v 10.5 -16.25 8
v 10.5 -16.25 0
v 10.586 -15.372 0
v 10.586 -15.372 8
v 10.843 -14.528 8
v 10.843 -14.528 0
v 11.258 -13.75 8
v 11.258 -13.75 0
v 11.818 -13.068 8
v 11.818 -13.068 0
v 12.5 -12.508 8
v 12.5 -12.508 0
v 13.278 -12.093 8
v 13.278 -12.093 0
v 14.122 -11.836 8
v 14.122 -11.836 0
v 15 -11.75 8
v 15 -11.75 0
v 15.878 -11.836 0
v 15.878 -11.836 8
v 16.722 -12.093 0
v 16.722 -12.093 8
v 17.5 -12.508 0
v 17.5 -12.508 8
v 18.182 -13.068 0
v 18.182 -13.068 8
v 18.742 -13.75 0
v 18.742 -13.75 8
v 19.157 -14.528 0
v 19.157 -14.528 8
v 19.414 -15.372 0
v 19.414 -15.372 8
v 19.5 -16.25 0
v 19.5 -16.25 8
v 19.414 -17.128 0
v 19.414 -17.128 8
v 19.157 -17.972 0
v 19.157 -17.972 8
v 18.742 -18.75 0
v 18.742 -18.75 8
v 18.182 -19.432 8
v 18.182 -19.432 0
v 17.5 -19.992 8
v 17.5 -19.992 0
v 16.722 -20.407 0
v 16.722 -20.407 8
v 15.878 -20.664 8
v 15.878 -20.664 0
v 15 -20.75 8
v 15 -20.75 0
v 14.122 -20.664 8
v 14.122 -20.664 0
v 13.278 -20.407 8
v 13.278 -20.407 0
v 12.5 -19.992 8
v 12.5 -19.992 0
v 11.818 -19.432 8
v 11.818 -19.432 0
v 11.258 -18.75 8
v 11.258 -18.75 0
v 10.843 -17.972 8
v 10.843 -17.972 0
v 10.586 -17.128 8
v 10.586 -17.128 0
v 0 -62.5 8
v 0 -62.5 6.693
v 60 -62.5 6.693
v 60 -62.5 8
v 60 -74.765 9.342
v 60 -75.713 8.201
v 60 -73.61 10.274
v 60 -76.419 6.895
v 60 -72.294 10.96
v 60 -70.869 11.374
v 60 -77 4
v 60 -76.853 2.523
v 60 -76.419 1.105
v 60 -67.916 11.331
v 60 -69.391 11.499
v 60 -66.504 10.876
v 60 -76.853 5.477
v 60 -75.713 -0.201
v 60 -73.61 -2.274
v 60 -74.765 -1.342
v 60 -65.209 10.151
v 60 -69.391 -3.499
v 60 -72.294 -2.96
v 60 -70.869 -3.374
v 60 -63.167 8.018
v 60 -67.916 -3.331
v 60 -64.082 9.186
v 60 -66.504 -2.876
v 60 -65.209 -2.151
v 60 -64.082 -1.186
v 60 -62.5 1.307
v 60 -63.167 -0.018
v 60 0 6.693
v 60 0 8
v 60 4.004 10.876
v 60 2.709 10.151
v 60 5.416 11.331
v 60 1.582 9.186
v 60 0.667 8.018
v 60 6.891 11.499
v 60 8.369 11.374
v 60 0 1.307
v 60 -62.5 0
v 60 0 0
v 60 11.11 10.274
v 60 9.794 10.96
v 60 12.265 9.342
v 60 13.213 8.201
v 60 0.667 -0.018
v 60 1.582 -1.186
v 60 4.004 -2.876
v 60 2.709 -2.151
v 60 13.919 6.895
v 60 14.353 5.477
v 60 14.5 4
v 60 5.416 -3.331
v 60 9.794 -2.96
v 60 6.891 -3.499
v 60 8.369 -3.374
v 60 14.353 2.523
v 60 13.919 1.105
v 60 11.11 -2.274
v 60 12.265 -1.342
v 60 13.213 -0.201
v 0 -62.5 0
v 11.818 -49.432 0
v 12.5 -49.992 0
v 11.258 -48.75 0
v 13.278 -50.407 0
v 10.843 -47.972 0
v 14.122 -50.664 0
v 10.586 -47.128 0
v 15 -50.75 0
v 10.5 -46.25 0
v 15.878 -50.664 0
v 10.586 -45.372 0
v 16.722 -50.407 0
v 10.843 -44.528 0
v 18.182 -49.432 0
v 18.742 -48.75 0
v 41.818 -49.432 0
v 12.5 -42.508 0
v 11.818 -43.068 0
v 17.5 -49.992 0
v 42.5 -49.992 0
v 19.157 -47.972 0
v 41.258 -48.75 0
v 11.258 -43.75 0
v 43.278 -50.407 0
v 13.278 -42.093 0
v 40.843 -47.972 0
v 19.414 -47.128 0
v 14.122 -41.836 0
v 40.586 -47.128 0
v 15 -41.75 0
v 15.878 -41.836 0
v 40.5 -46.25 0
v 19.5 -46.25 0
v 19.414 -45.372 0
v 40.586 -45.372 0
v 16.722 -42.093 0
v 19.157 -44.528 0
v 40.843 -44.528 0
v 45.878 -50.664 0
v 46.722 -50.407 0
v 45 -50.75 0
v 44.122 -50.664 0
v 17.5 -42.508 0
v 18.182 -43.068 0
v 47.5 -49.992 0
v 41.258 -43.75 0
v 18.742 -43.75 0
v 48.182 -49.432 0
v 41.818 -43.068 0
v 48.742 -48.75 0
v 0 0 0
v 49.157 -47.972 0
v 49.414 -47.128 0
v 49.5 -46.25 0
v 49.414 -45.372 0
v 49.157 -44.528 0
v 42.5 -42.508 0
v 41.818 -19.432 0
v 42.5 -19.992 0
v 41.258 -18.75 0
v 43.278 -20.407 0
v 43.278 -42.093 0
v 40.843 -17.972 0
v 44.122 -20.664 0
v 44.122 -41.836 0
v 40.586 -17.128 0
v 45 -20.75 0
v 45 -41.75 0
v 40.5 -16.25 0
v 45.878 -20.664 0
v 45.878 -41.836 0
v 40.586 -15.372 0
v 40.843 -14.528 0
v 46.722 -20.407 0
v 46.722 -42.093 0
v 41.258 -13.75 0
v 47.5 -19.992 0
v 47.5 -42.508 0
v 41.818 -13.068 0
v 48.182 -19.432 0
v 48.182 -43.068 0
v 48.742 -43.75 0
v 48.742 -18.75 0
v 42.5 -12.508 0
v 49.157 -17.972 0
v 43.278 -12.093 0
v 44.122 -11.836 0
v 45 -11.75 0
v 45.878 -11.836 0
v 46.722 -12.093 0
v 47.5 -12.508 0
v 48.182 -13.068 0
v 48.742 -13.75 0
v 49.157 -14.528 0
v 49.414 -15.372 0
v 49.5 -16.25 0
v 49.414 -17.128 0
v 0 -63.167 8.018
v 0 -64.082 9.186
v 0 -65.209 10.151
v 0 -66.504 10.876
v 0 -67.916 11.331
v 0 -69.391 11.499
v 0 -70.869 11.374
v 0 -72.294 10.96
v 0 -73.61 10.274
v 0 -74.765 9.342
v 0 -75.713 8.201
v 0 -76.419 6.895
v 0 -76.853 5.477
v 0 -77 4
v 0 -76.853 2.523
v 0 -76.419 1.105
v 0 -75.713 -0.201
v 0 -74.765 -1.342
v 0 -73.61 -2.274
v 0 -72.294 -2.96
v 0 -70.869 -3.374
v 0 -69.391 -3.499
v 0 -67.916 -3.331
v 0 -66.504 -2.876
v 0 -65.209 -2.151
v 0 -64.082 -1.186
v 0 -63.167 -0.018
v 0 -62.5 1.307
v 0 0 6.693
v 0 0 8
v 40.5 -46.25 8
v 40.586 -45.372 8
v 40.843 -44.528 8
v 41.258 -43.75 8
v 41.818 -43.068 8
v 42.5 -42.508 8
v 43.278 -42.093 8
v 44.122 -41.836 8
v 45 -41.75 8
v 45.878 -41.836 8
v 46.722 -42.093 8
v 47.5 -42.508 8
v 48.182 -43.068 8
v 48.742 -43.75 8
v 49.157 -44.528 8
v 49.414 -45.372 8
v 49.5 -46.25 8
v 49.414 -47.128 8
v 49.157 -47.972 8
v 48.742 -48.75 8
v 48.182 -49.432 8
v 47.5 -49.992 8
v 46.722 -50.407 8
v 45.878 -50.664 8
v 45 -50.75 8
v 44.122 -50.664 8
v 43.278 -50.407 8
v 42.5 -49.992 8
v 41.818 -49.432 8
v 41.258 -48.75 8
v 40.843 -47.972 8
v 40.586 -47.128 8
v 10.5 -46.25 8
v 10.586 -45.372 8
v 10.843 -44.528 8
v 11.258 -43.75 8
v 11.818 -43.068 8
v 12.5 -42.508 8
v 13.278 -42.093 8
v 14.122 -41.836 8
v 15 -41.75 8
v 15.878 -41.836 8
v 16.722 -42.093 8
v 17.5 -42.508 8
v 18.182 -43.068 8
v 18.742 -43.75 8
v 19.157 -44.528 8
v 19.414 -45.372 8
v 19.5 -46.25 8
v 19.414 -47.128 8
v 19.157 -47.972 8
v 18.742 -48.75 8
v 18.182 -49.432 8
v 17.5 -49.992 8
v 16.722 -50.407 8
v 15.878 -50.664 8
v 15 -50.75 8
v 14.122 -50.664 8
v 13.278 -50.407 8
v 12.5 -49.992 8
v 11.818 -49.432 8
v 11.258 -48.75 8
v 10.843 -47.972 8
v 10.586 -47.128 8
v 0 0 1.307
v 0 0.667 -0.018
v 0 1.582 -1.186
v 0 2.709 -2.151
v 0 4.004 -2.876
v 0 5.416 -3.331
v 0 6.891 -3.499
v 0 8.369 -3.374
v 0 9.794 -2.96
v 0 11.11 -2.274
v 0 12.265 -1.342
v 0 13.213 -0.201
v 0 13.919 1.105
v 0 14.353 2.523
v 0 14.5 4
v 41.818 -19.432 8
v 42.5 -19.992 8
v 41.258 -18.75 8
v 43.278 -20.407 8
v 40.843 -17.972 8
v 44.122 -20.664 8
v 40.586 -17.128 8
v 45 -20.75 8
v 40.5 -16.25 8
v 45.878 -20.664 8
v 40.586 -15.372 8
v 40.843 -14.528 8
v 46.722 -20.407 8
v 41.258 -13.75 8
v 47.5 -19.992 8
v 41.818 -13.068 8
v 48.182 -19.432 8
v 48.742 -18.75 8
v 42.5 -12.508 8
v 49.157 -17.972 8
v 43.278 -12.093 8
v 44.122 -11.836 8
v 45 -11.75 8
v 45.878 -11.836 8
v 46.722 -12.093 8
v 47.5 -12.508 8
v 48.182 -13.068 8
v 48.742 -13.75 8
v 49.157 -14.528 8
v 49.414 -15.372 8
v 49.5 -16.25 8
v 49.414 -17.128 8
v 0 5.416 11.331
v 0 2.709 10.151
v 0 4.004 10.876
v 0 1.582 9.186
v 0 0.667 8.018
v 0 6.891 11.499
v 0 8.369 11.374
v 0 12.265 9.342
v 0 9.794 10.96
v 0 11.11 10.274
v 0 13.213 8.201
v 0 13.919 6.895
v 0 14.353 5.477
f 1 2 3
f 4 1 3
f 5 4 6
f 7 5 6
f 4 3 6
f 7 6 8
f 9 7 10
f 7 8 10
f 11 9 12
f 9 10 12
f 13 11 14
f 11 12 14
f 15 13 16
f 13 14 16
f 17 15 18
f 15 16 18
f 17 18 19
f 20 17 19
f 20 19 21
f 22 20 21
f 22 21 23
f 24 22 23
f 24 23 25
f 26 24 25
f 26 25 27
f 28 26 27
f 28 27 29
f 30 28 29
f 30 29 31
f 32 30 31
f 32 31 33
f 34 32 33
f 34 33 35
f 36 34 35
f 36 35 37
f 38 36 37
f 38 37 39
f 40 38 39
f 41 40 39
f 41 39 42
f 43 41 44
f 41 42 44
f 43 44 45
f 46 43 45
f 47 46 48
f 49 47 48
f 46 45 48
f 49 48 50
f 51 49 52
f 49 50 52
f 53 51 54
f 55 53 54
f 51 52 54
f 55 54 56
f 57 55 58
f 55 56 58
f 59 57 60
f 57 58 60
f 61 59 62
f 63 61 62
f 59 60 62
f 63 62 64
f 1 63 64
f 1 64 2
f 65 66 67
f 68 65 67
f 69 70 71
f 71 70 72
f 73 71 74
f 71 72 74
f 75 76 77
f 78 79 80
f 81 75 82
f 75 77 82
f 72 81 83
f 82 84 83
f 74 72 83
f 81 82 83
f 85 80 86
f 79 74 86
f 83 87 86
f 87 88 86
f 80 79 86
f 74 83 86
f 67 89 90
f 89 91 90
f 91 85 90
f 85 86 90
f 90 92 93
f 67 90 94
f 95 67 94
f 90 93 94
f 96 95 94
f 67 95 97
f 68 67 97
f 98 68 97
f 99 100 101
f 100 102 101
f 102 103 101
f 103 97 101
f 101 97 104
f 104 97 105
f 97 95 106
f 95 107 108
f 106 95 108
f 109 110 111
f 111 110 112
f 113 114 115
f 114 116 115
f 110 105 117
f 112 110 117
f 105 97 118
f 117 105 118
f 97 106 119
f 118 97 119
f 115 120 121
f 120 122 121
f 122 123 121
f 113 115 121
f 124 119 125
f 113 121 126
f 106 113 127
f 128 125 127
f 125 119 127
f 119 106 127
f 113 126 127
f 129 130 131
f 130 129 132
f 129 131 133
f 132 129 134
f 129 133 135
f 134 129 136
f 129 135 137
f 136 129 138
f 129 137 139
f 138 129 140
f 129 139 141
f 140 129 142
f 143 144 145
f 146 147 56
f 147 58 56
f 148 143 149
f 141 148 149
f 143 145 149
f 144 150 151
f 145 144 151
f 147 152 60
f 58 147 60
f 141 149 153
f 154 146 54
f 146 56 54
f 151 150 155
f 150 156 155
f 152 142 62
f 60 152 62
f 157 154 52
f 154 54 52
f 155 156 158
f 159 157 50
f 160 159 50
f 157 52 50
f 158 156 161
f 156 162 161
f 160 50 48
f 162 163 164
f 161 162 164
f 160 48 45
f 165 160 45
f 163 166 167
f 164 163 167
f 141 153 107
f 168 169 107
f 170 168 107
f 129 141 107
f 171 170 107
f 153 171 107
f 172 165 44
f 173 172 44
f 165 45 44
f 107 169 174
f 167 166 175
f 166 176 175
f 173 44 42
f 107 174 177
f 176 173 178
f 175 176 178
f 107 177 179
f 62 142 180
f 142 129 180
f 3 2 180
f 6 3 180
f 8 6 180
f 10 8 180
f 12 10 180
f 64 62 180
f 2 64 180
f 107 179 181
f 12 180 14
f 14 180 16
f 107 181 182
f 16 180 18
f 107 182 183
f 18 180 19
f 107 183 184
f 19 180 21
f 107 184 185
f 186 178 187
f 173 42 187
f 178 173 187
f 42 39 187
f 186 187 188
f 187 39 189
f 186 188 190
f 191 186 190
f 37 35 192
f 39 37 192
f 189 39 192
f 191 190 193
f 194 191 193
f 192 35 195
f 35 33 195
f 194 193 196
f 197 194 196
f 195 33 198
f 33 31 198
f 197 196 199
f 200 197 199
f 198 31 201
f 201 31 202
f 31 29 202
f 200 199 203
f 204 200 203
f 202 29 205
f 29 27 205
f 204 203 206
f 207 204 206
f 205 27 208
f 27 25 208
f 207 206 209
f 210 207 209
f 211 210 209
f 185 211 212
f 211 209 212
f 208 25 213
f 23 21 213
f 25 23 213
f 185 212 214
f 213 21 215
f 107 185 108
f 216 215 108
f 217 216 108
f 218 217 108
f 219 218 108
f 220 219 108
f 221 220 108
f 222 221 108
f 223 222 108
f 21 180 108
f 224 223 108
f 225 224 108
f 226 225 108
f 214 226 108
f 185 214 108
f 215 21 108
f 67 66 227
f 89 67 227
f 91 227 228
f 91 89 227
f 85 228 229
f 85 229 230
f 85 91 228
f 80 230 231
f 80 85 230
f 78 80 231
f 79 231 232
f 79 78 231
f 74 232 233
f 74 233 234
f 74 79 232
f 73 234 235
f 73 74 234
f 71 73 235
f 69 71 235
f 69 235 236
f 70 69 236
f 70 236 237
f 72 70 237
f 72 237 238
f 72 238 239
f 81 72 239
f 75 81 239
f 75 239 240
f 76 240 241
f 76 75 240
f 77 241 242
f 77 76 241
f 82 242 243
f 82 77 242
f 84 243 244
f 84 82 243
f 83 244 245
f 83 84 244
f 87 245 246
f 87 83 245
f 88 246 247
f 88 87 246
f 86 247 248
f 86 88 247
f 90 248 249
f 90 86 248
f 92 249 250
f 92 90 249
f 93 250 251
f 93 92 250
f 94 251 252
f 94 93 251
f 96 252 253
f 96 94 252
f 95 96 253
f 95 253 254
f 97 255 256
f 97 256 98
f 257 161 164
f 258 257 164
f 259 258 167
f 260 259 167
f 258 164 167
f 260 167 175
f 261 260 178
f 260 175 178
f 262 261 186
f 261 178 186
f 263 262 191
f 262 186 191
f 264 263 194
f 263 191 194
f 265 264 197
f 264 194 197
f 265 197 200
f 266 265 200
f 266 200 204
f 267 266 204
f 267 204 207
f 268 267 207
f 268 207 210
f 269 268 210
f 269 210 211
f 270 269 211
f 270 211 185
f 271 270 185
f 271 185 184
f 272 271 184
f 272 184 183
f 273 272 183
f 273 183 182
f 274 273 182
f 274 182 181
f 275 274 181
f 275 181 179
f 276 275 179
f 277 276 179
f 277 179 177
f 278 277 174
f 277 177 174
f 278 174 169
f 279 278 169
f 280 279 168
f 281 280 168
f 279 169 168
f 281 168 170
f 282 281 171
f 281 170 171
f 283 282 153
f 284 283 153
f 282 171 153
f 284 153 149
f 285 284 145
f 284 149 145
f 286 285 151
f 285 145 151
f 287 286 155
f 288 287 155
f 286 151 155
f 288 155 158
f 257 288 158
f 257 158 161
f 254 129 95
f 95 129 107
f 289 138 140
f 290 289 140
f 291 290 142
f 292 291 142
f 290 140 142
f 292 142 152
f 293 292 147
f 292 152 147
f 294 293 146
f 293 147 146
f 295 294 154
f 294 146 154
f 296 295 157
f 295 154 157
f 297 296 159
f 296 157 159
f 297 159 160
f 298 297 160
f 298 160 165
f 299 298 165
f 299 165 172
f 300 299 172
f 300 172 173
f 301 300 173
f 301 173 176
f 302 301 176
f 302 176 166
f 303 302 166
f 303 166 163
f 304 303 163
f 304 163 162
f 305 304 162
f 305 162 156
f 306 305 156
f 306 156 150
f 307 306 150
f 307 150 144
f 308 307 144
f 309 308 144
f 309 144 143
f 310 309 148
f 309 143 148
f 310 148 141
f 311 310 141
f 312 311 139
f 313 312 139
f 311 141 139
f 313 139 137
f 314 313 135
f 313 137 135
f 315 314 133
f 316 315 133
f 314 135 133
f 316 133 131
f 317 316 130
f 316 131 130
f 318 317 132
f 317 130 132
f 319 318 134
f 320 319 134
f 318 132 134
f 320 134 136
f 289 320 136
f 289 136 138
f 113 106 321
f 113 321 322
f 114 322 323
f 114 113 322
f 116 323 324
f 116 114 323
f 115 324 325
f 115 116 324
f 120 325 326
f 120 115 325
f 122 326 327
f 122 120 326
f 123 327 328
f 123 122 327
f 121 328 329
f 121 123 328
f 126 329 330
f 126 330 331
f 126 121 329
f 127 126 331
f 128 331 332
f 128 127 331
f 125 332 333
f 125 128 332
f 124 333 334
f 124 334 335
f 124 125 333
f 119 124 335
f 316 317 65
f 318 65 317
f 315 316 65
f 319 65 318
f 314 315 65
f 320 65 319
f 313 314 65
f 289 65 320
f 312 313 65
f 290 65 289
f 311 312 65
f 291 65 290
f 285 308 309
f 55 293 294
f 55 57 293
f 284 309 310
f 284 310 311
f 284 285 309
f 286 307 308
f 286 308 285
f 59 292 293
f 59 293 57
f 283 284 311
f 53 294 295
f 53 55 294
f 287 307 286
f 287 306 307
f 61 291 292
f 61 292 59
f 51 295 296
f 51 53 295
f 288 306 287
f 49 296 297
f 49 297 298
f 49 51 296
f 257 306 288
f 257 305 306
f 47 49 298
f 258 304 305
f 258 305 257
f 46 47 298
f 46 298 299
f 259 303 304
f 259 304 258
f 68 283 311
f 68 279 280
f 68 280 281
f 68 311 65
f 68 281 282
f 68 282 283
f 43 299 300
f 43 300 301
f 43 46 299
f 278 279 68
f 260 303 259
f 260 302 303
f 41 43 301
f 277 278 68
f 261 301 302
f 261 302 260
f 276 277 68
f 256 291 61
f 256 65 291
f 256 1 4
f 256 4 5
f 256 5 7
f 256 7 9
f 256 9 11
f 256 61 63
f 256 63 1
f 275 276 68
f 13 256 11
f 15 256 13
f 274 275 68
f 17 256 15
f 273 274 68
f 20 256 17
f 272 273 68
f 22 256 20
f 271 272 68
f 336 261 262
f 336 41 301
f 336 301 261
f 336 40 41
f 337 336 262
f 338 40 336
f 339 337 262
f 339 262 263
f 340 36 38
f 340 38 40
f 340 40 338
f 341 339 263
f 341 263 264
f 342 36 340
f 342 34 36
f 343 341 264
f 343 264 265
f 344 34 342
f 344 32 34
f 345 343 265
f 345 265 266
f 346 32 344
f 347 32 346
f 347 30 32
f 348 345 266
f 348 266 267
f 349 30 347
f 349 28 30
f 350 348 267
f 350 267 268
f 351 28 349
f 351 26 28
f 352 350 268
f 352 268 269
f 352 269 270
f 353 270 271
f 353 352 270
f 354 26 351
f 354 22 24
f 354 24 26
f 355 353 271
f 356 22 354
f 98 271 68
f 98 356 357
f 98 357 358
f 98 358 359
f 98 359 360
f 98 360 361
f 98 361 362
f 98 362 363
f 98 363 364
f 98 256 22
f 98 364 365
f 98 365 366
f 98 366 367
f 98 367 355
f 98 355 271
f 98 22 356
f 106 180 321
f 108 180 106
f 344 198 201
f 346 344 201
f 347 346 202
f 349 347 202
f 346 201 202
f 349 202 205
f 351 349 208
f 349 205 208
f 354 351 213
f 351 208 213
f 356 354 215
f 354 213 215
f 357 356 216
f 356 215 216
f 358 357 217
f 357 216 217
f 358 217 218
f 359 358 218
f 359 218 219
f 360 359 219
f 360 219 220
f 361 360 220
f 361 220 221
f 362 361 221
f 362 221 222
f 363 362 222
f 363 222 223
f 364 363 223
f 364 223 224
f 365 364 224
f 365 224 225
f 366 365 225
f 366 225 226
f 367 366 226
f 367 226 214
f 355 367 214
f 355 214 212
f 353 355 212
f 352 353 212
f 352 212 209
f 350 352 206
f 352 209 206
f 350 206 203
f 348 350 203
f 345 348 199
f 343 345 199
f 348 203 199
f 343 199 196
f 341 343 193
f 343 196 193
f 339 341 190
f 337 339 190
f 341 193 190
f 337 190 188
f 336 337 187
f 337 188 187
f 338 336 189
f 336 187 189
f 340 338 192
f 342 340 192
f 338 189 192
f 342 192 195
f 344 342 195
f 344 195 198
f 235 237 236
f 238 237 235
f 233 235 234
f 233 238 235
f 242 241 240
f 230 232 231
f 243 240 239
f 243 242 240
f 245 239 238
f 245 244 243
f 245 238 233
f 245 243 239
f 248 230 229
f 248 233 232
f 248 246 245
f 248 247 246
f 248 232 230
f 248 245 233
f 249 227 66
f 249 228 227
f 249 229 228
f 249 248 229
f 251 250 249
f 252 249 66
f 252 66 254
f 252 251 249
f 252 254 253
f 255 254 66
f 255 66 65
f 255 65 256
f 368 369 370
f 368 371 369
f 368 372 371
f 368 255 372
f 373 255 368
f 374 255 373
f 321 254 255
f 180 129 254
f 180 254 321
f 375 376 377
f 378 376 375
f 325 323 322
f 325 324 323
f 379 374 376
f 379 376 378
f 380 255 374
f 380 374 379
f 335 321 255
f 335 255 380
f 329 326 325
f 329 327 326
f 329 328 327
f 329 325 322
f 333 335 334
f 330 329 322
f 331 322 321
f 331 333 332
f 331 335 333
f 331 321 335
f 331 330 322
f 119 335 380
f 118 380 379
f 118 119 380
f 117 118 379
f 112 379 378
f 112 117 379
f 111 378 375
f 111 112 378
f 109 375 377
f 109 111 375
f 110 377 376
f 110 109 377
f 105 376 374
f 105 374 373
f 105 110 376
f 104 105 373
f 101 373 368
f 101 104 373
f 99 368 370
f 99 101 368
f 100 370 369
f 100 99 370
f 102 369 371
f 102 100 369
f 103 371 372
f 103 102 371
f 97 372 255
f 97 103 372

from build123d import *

# Parameters (mm, degrees)
F0_W     = 60
F0_H     = 62.5
F1_DEPTH = 8
F3_D     = 9
F3_DEPTH = 15
F3_TIP   = 2.7038727856
F5_DEPTH = 60


with BuildPart() as f1:
    # F0 (on Top) → F1 (new body)
    with BuildSketch(Plane.XY):
        with Locations((30, -31.25)):
            Rectangle(F0_W, F0_H)
    extrude(amount=F1_DEPTH)

    # F3
    with Locations(Plane.XY.offset(8)):
        with Locations((15, -16.25), (45, -16.25), (45, -46.25), (15, -46.25)):
            Hole(F3_D / 2, depth=F3_DEPTH)
            with Locations((0, 0, -(F3_DEPTH + F3_TIP / 2))):  # 118° drill point
                Cone(0, F3_D / 2, F3_TIP, mode=Mode.SUBTRACT)

    # F4 (on face) → F5 (join)
    with BuildSketch(Plane.YZ.offset(60)):
        with BuildLine():
            ThreePointArc((-62.5, 1.3074175964), (-62.1260593981, 2.6306936062), (-62, 4))
            ThreePointArc((-62, 4), (-62.1260593981, 5.3693063938), (-62.5, 6.6925824036))
            Line((-62.5, 6.6925824036), (-62.5, 1.3074175964))
        make_face()
        with BuildLine():
            Line((-62.5, 1.3074175964), (-62.5, 6.6925824036))
            ThreePointArc((-62.5, 6.6925824036), (-77, 4), (-62.5, 1.3074175964))
        make_face()
        with BuildLine():
            ThreePointArc((14.5, 4), (8.3693063938, 11.3739406019), (0, 6.6925824036))
            Line((0, 6.6925824036), (0, 1.3074175964))
            ThreePointArc((0, 1.3074175964), (8.3693063938, -3.3739406019), (14.5, 4))
        make_face()
    extrude(amount=-F5_DEPTH)


solid = f1.part
